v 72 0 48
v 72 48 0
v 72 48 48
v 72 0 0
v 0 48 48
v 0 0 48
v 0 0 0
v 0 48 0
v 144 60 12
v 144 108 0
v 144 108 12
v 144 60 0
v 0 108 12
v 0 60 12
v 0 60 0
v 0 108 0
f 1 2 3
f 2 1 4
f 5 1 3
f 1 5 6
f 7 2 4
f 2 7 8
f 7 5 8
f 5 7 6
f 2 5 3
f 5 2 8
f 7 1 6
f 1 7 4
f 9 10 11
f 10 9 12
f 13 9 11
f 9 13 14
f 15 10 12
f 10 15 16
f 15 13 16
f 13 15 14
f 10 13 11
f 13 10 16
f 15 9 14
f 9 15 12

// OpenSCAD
module Uchannel(holes) {
    cube([24*(holes)+24, 48, 48]);
}

module LUchannel(holes) {
    cube([24*(holes)+24, 48, 12]);
}

Uchannel(2);
translate([0, 60, 0]) LUchannel(5);
